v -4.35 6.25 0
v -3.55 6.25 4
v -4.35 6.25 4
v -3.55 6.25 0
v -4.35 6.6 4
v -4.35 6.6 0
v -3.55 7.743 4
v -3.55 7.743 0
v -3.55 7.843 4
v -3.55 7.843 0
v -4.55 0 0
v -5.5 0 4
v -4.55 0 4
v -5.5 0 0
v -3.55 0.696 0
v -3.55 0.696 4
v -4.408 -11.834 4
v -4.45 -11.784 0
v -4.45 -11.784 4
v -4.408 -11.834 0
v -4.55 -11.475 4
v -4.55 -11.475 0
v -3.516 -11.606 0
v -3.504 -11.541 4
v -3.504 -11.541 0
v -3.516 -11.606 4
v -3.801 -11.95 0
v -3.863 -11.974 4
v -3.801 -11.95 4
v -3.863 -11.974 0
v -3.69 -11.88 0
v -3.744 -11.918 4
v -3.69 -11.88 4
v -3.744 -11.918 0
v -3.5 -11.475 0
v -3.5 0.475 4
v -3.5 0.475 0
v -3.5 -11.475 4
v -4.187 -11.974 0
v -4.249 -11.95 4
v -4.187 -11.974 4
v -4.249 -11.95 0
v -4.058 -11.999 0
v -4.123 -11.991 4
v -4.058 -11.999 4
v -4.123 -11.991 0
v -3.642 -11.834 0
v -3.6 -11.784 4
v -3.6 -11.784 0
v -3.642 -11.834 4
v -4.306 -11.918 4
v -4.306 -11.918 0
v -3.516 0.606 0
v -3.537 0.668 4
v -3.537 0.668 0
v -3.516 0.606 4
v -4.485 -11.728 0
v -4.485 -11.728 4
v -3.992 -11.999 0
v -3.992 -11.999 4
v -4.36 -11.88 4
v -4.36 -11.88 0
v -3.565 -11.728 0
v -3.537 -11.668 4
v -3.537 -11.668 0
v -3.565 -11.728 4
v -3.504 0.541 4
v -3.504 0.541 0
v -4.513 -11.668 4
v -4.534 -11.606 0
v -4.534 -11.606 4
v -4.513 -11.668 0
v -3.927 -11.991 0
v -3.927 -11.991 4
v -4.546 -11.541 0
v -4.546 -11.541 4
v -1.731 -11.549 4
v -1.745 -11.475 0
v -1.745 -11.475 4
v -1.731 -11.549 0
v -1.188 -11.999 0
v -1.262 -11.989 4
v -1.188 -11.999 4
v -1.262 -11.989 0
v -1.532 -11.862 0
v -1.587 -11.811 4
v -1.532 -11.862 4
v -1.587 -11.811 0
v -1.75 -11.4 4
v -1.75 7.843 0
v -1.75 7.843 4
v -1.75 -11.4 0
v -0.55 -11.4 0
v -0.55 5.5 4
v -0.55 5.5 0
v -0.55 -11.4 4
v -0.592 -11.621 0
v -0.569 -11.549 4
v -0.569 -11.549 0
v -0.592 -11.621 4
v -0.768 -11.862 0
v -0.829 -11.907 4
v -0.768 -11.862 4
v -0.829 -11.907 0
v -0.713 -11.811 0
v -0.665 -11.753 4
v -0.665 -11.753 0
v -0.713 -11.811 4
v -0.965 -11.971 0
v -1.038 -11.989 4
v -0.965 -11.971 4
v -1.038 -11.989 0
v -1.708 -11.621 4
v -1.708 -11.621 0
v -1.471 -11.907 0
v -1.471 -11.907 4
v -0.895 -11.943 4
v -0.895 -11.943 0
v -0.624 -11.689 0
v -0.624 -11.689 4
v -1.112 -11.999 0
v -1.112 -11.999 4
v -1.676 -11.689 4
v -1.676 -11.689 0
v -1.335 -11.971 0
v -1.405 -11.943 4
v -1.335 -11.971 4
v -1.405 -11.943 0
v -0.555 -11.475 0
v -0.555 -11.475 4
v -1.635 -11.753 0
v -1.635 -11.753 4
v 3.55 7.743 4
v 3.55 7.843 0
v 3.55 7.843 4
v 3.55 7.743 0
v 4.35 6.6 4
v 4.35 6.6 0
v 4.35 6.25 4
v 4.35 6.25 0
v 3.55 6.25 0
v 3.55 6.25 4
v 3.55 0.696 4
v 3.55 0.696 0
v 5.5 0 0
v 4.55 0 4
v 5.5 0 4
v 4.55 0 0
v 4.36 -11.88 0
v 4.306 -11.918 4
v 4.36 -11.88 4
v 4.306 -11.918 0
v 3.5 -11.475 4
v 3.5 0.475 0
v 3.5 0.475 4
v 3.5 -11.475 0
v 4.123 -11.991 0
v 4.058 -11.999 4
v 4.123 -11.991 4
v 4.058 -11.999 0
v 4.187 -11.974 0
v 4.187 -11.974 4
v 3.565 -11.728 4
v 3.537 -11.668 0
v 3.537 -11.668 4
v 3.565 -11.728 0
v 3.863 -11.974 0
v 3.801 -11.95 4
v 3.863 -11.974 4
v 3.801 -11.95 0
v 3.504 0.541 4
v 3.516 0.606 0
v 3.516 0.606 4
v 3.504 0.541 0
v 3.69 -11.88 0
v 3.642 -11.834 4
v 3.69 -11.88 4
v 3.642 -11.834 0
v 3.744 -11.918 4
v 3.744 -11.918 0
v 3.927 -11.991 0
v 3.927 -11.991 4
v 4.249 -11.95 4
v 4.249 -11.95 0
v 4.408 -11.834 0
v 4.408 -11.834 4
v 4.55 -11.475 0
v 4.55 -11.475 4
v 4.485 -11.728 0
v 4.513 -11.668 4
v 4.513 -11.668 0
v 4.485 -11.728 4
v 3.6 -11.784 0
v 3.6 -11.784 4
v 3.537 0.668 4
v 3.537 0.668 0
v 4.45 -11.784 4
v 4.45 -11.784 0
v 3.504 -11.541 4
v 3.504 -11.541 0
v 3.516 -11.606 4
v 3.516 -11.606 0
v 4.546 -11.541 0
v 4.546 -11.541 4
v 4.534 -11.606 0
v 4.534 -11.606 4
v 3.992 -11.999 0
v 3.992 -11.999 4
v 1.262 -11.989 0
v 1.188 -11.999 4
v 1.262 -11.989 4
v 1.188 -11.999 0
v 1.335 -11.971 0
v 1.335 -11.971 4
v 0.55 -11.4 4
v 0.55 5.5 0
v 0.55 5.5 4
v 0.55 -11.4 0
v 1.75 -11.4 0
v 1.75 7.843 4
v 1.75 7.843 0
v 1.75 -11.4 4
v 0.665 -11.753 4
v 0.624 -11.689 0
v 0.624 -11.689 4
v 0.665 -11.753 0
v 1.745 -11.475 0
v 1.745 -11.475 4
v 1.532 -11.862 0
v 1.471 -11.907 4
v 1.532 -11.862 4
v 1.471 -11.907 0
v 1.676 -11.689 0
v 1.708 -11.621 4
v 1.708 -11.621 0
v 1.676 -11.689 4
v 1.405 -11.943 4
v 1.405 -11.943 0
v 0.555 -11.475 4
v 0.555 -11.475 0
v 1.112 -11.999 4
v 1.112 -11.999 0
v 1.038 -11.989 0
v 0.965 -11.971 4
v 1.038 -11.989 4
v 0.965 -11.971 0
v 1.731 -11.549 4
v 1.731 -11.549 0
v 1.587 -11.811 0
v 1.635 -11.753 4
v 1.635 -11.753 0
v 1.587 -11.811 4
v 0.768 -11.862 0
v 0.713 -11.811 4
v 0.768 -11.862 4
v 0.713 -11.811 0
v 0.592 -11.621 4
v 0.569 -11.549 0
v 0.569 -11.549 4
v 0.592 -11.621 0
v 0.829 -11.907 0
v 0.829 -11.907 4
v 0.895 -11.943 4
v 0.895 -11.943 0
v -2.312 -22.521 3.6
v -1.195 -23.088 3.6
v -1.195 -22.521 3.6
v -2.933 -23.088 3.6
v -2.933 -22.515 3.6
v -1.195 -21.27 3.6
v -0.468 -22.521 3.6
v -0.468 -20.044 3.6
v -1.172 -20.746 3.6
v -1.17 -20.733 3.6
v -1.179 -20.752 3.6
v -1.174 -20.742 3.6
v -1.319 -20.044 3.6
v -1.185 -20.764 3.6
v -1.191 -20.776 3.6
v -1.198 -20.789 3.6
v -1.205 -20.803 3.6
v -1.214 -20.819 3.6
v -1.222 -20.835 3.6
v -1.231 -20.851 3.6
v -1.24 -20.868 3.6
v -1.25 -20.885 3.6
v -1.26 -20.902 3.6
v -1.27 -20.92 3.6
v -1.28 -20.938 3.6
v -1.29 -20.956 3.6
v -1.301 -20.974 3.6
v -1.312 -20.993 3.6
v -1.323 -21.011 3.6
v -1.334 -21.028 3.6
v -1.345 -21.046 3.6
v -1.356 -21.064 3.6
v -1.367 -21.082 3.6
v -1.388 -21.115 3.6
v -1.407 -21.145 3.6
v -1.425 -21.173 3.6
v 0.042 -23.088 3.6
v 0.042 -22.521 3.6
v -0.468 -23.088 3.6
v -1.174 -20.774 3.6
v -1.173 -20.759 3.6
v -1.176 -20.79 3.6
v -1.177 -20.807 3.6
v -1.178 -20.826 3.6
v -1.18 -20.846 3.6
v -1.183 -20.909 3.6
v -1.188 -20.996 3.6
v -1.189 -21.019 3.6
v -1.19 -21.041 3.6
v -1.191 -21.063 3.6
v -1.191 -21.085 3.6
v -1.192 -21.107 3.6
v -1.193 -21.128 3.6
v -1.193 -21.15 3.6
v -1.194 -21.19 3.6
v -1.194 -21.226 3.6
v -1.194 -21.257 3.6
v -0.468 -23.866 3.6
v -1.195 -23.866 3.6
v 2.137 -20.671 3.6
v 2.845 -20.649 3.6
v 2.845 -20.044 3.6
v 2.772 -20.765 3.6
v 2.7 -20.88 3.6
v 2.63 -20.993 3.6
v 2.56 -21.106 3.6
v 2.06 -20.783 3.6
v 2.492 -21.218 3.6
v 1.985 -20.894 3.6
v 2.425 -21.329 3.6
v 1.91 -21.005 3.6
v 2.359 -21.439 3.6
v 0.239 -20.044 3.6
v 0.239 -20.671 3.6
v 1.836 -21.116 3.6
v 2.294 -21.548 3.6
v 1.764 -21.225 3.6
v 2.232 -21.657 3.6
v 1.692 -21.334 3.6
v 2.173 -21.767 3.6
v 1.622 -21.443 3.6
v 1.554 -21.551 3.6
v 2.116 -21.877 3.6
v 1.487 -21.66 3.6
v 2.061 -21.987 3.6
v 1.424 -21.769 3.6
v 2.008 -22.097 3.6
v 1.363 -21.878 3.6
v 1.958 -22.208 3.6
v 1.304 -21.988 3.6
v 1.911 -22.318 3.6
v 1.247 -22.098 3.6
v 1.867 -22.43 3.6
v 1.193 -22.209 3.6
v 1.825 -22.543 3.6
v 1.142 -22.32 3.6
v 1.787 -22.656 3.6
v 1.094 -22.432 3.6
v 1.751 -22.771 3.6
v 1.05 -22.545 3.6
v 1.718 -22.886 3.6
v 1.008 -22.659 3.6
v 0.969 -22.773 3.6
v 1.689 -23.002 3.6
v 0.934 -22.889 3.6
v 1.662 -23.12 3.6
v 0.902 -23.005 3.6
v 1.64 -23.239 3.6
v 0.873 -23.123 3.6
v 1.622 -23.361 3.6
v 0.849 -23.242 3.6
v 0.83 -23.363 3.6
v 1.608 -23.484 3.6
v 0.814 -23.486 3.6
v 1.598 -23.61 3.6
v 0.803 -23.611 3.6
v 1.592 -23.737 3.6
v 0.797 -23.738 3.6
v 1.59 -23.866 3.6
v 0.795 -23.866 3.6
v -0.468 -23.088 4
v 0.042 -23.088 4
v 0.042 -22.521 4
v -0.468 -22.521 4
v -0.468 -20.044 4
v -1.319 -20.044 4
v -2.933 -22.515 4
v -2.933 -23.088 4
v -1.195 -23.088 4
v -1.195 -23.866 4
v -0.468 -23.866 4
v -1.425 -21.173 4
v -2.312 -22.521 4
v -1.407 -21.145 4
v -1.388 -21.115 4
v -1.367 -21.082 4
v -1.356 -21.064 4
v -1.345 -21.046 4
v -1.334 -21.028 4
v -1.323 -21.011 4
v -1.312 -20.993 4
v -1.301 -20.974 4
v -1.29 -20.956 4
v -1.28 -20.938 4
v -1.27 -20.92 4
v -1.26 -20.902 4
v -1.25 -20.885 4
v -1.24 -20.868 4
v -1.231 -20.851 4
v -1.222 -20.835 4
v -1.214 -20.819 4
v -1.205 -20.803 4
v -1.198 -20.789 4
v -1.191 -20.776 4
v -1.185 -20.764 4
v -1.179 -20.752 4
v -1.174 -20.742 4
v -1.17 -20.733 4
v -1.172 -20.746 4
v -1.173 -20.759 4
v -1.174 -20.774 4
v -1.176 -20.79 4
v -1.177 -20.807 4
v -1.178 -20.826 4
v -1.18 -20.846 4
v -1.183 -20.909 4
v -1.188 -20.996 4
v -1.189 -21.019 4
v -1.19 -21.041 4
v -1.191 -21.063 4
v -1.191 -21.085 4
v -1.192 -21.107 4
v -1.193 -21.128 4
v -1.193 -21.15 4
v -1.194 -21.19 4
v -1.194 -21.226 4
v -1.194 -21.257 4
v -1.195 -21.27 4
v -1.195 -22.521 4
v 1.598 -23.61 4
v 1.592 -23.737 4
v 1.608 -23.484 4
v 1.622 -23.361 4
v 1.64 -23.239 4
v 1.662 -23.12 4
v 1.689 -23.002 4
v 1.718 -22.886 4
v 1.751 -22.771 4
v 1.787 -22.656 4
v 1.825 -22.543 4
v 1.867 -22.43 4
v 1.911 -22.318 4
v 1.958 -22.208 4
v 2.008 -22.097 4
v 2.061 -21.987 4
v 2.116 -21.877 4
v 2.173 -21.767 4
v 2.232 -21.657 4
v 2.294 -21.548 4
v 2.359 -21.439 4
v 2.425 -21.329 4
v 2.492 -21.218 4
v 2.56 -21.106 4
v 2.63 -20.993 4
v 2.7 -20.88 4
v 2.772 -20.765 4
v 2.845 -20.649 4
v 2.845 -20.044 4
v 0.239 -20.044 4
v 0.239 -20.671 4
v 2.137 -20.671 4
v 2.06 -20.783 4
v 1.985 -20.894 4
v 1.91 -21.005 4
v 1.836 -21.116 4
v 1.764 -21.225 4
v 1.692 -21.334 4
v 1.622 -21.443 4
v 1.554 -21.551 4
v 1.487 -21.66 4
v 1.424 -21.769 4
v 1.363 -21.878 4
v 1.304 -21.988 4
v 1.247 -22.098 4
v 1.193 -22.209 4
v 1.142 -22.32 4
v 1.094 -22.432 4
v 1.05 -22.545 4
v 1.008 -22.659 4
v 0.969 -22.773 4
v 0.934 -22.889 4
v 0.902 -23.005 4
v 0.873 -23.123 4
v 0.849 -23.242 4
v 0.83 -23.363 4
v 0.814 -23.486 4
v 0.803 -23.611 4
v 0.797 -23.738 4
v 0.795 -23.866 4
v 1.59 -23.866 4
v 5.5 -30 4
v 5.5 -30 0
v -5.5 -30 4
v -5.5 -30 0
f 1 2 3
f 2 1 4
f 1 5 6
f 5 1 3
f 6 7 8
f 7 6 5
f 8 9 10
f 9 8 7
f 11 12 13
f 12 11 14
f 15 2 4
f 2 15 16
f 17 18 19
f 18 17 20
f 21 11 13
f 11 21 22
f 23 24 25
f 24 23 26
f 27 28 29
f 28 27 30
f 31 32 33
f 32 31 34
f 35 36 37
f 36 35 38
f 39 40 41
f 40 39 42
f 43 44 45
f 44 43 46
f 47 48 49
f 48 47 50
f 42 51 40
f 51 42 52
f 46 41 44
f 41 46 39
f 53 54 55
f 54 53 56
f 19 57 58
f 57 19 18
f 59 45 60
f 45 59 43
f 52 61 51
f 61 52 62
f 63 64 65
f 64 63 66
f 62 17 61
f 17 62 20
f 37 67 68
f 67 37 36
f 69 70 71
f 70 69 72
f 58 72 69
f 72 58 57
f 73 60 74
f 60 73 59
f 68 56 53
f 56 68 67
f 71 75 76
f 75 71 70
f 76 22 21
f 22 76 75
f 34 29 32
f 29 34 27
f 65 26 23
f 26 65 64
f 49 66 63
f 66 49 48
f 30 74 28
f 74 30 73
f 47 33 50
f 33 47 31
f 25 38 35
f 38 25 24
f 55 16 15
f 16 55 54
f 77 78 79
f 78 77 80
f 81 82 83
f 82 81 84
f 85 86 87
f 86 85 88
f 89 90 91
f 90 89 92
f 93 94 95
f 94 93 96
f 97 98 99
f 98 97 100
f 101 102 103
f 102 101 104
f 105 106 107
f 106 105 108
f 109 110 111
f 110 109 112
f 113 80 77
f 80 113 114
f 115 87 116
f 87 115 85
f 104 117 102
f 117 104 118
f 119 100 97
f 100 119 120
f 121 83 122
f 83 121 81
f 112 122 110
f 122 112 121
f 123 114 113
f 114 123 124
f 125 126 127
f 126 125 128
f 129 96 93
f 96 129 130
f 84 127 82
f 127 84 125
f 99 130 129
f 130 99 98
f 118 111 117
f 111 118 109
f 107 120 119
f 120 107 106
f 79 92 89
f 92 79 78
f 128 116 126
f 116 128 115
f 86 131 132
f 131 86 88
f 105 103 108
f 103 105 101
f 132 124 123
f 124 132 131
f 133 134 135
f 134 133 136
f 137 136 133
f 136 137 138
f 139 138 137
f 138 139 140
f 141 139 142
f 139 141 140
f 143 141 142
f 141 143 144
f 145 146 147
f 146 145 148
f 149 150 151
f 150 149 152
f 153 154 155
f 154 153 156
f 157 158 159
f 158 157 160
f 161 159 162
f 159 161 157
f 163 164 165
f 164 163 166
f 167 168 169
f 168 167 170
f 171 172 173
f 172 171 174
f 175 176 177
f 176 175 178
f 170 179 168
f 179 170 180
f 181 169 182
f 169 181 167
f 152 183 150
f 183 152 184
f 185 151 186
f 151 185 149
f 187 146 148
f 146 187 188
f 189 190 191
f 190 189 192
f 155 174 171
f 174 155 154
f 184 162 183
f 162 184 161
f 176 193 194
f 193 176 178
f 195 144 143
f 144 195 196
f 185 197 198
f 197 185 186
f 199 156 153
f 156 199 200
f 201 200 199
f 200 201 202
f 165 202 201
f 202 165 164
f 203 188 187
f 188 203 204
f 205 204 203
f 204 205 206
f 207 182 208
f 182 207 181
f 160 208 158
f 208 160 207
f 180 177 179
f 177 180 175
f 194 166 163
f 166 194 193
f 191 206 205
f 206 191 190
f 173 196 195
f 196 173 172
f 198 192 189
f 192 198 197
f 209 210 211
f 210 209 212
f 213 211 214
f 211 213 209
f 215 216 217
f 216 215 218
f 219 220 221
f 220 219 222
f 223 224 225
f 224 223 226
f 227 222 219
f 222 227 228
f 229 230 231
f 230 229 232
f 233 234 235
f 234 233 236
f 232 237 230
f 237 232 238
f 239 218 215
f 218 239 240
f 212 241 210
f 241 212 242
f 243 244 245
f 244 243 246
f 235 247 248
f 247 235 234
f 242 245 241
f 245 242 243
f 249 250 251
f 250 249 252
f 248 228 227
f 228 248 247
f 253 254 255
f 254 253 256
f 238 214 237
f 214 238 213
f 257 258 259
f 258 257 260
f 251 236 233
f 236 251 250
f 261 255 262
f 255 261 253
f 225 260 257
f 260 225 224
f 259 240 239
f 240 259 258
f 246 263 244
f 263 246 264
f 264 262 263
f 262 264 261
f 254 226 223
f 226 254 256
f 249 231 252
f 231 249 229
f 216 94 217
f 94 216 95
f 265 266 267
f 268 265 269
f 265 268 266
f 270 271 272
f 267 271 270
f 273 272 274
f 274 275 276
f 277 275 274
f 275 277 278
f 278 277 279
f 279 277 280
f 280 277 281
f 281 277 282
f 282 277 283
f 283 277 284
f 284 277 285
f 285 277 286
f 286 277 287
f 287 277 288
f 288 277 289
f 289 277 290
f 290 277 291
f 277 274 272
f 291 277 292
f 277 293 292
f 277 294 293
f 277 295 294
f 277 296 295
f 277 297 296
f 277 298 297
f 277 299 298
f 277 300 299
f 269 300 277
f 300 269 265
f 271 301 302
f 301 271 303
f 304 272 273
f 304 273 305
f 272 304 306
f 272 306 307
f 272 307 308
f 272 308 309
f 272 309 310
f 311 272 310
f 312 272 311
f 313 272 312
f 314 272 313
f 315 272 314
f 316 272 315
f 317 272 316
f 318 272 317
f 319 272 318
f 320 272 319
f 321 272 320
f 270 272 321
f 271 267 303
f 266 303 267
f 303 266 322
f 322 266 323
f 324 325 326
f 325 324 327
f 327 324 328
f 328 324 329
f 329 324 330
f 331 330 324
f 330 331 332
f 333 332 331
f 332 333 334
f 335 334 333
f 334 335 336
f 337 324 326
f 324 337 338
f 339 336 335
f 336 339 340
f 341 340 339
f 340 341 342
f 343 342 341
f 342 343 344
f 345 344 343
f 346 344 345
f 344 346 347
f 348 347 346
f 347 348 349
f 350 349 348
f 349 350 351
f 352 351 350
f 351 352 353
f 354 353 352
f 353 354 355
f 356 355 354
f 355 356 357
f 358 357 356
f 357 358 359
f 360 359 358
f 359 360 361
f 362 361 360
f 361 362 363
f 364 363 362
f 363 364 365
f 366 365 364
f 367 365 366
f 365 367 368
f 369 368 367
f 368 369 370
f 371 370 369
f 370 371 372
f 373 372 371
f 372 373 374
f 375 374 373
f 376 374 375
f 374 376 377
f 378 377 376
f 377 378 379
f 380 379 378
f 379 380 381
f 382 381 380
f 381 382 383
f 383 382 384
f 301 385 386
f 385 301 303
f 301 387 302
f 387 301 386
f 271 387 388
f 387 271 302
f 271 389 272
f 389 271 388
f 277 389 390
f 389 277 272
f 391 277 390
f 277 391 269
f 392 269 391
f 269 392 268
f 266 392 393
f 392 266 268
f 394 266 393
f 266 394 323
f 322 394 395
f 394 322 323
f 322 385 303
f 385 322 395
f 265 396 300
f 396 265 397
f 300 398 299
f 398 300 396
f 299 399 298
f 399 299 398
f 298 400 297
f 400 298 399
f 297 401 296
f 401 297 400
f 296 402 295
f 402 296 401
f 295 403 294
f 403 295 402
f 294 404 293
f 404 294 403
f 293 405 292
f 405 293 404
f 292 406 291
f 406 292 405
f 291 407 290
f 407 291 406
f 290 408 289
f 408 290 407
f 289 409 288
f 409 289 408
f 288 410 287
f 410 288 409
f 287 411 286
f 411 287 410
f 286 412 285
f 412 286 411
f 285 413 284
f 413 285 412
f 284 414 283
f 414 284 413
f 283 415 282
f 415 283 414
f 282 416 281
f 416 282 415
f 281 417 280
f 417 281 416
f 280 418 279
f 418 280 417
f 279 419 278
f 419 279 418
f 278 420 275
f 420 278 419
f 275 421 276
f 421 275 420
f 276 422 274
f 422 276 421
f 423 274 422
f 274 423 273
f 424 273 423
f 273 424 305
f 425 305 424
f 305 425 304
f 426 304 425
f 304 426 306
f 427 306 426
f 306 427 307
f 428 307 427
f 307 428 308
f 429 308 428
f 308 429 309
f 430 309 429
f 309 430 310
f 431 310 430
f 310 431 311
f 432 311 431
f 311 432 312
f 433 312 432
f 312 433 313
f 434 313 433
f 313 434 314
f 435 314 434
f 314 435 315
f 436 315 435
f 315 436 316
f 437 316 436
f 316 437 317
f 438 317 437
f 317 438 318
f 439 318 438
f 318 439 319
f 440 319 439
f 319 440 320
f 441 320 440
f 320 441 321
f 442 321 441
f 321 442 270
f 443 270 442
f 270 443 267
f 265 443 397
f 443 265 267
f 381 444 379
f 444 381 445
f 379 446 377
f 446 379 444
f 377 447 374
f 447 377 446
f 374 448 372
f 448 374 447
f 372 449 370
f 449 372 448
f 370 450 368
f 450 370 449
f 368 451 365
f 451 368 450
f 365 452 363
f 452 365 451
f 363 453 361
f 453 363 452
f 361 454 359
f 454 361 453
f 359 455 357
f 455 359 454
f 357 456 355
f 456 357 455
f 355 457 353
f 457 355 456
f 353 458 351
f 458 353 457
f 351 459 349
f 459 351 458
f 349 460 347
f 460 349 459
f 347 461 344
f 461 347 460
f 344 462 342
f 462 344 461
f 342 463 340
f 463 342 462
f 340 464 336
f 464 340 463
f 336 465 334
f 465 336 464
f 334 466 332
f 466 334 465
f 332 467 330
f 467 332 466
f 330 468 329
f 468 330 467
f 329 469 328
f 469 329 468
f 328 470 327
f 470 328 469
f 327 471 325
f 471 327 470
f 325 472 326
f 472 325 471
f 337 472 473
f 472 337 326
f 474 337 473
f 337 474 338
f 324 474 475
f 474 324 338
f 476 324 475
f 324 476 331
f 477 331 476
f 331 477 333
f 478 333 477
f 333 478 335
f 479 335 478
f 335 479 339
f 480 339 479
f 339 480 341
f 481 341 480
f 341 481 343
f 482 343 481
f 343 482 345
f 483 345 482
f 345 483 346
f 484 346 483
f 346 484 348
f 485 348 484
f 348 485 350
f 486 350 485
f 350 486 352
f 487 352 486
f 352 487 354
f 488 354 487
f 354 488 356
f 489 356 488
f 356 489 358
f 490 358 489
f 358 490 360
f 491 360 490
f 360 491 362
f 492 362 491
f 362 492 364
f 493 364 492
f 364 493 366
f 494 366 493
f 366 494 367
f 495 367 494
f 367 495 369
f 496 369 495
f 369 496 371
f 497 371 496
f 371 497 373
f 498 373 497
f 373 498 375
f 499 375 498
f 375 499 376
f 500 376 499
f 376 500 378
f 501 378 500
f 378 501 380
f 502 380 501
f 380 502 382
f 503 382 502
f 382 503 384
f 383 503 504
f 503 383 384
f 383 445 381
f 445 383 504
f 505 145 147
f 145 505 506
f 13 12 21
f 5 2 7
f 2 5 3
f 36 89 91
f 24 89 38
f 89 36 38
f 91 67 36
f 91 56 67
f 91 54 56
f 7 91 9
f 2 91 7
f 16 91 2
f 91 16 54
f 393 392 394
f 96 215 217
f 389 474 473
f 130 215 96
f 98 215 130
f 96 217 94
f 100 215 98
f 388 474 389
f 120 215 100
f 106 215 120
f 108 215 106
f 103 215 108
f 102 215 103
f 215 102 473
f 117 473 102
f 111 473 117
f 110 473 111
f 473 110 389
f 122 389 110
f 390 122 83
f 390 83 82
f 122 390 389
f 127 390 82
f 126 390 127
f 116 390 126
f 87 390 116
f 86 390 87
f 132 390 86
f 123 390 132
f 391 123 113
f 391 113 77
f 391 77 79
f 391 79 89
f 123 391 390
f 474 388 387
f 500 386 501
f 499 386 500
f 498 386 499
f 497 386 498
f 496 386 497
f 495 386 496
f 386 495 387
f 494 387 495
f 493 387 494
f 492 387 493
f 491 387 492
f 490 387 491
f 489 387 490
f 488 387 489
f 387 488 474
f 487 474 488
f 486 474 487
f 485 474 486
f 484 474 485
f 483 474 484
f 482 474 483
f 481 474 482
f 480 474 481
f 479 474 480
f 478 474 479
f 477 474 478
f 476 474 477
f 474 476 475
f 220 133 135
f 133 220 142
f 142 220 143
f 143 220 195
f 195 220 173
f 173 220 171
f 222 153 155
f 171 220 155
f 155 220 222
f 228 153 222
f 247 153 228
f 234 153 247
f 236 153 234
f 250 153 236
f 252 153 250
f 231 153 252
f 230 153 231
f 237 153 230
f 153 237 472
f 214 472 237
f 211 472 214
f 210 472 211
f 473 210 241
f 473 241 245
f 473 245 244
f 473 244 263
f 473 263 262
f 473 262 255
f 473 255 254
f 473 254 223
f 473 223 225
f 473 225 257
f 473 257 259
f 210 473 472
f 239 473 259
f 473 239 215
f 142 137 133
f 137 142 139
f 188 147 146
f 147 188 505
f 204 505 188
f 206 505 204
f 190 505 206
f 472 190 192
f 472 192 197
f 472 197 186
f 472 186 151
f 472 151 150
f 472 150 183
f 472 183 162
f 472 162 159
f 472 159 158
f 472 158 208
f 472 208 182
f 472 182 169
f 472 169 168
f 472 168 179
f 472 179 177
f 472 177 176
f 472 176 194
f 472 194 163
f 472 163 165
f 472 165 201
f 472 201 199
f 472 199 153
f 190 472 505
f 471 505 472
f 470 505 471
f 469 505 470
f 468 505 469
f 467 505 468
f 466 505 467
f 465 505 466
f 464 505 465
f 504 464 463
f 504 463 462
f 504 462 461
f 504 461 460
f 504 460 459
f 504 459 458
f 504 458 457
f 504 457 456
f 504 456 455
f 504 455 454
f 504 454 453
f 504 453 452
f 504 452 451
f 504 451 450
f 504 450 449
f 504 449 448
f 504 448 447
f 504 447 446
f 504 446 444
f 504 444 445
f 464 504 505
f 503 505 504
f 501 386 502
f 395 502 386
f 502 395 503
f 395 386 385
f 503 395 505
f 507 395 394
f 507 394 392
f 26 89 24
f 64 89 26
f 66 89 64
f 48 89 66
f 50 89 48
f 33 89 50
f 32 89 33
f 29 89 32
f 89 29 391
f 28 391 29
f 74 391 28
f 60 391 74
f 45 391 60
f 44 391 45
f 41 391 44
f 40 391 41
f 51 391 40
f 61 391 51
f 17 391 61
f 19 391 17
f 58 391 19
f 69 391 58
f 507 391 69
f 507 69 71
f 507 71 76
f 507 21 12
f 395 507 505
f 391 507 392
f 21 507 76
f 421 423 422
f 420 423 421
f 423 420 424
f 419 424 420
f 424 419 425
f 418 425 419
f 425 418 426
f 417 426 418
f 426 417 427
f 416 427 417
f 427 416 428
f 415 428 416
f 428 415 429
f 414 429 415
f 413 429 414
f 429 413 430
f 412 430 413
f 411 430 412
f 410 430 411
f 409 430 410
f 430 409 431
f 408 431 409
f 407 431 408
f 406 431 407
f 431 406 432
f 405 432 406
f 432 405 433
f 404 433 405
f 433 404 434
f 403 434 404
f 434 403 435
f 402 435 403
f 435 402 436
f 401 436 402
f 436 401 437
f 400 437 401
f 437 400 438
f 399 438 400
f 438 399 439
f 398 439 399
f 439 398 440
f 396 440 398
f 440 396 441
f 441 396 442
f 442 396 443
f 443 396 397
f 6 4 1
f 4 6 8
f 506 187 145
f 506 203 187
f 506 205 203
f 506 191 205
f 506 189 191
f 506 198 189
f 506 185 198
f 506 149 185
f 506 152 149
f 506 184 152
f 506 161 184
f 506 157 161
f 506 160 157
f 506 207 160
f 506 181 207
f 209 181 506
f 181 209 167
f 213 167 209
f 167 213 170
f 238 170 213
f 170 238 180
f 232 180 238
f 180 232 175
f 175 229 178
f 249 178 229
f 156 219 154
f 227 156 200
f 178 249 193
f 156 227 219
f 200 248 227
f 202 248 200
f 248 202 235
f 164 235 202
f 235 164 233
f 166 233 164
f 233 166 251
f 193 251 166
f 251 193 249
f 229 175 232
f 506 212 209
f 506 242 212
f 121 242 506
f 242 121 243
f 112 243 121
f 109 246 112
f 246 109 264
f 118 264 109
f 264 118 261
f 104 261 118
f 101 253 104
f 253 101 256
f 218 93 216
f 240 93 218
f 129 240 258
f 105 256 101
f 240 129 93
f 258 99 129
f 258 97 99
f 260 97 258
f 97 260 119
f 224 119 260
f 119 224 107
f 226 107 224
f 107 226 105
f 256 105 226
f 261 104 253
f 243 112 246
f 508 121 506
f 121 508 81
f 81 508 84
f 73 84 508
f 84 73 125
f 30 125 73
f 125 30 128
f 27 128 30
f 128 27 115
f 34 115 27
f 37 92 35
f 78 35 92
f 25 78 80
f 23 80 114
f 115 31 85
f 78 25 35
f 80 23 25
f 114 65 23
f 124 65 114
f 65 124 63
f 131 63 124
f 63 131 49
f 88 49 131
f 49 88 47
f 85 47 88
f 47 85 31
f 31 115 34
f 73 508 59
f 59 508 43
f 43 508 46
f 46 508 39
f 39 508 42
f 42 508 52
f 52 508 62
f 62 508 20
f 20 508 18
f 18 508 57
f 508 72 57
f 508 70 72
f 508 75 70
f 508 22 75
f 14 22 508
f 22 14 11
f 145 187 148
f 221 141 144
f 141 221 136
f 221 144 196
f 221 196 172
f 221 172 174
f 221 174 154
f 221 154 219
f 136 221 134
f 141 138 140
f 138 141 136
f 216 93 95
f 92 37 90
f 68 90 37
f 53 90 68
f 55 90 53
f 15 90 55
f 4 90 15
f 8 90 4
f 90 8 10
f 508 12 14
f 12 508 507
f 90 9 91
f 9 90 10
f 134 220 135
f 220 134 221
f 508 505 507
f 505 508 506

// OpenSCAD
$fn = 50;

difference() {
	union() {
		translate(v = [0, 0, 0]) {
			rotate(a = [0, 0, 0]) {
				difference() {
					union() {
						translate(v = [-5.5, -30.0, 0]) {
							cube(size = [11.0, 37.84251840539369, 4.0]);
						}
					}
					union() {
						translate(v = [0, 0, -0.1]) {
							linear_extrude(height = 4.2) {
								polygon(points = [[-3.55, 0], [-3.55, 6.25], [-4.35, 6.25], [-4.35, 6.6], [-3.55, 7.7425184053936915], [-3.55, 8.84251840539369], [-5.7, 8.84251840539369], [-5.7, 0]]);
							}
						}
						translate(v = [-4.0249999999999995, -5.5, -0.1]) {
							hull() {
								translate(v = [-0.0, 5.975, 0]) {
									cylinder(h = 4.2, r = 0.525);
								}
								translate(v = [0.0, 5.975, 0]) {
									cylinder(h = 4.2, r = 0.525);
								}
								translate(v = [-0.0, -5.975, 0]) {
									cylinder(h = 4.2, r = 0.525);
								}
								translate(v = [0.0, -5.975, 0]) {
									cylinder(h = 4.2, r = 0.525);
								}
							}
						}
						translate(v = [-1.15, -1.5787407973031549, -0.1]) {
							hull() {
								translate(v = [-0.0, 9.821259202696845, 0]) {
									cylinder(h = 4.2, r = 0.5999999999999999);
								}
								translate(v = [0.0, 9.821259202696845, 0]) {
									cylinder(h = 4.2, r = 0.5999999999999999);
								}
								translate(v = [-0.0, -9.821259202696845, 0]) {
									cylinder(h = 4.2, r = 0.5999999999999999);
								}
								translate(v = [0.0, -9.821259202696845, 0]) {
									cylinder(h = 4.2, r = 0.5999999999999999);
								}
							}
						}
						translate(v = [0, 0, -0.1]) {
							linear_extrude(height = 4.2) {
								polygon(points = [[3.55, 0], [3.55, 6.25], [4.35, 6.25], [4.35, 6.6], [3.55, 7.7425184053936915], [3.55, 8.84251840539369], [5.7, 8.84251840539369], [5.7, 0]]);
							}
						}
						translate(v = [4.0249999999999995, -5.5, -0.1]) {
							hull() {
								translate(v = [-0.0, 5.975, 0]) {
									cylinder(h = 4.2, r = 0.525);
								}
								translate(v = [0.0, 5.975, 0]) {
									cylinder(h = 4.2, r = 0.525);
								}
								translate(v = [-0.0, -5.975, 0]) {
									cylinder(h = 4.2, r = 0.525);
								}
								translate(v = [0.0, -5.975, 0]) {
									cylinder(h = 4.2, r = 0.525);
								}
							}
						}
						translate(v = [1.15, -1.5787407973031549, -0.1]) {
							hull() {
								translate(v = [-0.0, 9.821259202696845, 0]) {
									cylinder(h = 4.2, r = 0.5999999999999999);
								}
								translate(v = [0.0, 9.821259202696845, 0]) {
									cylinder(h = 4.2, r = 0.5999999999999999);
								}
								translate(v = [-0.0, -9.821259202696845, 0]) {
									cylinder(h = 4.2, r = 0.5999999999999999);
								}
								translate(v = [0.0, -9.821259202696845, 0]) {
									cylinder(h = 4.2, r = 0.5999999999999999);
								}
							}
						}
						translate(v = [-0.6000000000000001, 5.5, -0.1]) {
							cube(size = [1.2000000000000002, 3.342518405393691, 4.2]);
						}
						translate(v = [0, -22, 3.6]) {
							linear_extrude(height = 0.5) {
								text(font = "Arial:style=Bold", halign = "center", size = 4.0, text = "47", valign = "center");
							}
						}
					}
				}
			}
		}
	}
	union();
}
